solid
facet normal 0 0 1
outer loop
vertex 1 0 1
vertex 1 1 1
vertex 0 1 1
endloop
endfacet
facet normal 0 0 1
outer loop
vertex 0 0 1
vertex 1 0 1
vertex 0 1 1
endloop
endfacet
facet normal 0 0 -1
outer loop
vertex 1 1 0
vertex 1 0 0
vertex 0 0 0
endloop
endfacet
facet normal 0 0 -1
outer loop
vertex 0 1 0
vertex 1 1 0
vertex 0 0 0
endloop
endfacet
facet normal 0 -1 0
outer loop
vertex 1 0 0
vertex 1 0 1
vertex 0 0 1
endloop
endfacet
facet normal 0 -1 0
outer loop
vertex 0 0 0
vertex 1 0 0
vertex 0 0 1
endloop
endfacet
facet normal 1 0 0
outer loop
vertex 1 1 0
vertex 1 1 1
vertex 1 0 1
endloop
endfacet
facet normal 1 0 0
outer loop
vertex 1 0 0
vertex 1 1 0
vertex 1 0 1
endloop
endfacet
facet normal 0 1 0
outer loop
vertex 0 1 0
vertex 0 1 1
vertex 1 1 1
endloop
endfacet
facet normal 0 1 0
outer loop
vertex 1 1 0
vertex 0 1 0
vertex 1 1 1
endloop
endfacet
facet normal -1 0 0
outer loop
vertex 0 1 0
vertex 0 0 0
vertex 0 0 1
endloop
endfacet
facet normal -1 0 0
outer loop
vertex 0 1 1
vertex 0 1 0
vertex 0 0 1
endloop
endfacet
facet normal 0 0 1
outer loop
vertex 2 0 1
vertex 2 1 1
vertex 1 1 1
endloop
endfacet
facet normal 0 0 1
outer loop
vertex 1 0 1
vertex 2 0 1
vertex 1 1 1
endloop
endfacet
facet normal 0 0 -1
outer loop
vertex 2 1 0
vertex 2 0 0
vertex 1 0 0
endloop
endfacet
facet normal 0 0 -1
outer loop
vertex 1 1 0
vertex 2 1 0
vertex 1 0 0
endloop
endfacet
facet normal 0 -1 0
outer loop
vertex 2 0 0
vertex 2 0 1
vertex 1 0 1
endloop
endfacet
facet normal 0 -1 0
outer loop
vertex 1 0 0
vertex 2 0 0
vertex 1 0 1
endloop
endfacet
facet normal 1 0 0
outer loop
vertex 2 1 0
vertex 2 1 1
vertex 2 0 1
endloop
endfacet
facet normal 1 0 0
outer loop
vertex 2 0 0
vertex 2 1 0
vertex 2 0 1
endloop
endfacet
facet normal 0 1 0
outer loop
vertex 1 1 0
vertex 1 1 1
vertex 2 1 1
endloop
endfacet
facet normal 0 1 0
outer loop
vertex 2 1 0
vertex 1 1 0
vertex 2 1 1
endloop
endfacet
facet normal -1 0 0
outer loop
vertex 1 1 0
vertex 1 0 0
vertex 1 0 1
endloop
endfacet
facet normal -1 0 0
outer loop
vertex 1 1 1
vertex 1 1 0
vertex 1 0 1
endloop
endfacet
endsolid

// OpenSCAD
polyhedron(
  points=[
    [0, 0, 0],
    [1, 0, 0],
    [0, 1, 0],
    [1, 1, 0],
    [0, 0, 1],
    [1, 0, 1],
    [0, 1, 1],
    [1, 1, 1],

    [2, 0, 0],
    [2, 1, 0],
    [2, 0, 1],
    [2, 1, 1],
  ],
  faces=[
    [6,7,5],[6,5,4],
    [0,1,3],[0,3,2],
    [4,5,1],[4,1,0],
    [5,7,3],[5,3,1],
    [7,6,2],[7,2,3],
    [4,0,2],[4,2,6],
    [7,11,10],[7,10,5],
    [1,8,9],[1,9,3],
    [5,10,8],[5,8,1],
    [10,11,9],[10,9,8],
    [11,7,3],[11,3,9],
    [5,1,3],[5,3,7],
  ]);
